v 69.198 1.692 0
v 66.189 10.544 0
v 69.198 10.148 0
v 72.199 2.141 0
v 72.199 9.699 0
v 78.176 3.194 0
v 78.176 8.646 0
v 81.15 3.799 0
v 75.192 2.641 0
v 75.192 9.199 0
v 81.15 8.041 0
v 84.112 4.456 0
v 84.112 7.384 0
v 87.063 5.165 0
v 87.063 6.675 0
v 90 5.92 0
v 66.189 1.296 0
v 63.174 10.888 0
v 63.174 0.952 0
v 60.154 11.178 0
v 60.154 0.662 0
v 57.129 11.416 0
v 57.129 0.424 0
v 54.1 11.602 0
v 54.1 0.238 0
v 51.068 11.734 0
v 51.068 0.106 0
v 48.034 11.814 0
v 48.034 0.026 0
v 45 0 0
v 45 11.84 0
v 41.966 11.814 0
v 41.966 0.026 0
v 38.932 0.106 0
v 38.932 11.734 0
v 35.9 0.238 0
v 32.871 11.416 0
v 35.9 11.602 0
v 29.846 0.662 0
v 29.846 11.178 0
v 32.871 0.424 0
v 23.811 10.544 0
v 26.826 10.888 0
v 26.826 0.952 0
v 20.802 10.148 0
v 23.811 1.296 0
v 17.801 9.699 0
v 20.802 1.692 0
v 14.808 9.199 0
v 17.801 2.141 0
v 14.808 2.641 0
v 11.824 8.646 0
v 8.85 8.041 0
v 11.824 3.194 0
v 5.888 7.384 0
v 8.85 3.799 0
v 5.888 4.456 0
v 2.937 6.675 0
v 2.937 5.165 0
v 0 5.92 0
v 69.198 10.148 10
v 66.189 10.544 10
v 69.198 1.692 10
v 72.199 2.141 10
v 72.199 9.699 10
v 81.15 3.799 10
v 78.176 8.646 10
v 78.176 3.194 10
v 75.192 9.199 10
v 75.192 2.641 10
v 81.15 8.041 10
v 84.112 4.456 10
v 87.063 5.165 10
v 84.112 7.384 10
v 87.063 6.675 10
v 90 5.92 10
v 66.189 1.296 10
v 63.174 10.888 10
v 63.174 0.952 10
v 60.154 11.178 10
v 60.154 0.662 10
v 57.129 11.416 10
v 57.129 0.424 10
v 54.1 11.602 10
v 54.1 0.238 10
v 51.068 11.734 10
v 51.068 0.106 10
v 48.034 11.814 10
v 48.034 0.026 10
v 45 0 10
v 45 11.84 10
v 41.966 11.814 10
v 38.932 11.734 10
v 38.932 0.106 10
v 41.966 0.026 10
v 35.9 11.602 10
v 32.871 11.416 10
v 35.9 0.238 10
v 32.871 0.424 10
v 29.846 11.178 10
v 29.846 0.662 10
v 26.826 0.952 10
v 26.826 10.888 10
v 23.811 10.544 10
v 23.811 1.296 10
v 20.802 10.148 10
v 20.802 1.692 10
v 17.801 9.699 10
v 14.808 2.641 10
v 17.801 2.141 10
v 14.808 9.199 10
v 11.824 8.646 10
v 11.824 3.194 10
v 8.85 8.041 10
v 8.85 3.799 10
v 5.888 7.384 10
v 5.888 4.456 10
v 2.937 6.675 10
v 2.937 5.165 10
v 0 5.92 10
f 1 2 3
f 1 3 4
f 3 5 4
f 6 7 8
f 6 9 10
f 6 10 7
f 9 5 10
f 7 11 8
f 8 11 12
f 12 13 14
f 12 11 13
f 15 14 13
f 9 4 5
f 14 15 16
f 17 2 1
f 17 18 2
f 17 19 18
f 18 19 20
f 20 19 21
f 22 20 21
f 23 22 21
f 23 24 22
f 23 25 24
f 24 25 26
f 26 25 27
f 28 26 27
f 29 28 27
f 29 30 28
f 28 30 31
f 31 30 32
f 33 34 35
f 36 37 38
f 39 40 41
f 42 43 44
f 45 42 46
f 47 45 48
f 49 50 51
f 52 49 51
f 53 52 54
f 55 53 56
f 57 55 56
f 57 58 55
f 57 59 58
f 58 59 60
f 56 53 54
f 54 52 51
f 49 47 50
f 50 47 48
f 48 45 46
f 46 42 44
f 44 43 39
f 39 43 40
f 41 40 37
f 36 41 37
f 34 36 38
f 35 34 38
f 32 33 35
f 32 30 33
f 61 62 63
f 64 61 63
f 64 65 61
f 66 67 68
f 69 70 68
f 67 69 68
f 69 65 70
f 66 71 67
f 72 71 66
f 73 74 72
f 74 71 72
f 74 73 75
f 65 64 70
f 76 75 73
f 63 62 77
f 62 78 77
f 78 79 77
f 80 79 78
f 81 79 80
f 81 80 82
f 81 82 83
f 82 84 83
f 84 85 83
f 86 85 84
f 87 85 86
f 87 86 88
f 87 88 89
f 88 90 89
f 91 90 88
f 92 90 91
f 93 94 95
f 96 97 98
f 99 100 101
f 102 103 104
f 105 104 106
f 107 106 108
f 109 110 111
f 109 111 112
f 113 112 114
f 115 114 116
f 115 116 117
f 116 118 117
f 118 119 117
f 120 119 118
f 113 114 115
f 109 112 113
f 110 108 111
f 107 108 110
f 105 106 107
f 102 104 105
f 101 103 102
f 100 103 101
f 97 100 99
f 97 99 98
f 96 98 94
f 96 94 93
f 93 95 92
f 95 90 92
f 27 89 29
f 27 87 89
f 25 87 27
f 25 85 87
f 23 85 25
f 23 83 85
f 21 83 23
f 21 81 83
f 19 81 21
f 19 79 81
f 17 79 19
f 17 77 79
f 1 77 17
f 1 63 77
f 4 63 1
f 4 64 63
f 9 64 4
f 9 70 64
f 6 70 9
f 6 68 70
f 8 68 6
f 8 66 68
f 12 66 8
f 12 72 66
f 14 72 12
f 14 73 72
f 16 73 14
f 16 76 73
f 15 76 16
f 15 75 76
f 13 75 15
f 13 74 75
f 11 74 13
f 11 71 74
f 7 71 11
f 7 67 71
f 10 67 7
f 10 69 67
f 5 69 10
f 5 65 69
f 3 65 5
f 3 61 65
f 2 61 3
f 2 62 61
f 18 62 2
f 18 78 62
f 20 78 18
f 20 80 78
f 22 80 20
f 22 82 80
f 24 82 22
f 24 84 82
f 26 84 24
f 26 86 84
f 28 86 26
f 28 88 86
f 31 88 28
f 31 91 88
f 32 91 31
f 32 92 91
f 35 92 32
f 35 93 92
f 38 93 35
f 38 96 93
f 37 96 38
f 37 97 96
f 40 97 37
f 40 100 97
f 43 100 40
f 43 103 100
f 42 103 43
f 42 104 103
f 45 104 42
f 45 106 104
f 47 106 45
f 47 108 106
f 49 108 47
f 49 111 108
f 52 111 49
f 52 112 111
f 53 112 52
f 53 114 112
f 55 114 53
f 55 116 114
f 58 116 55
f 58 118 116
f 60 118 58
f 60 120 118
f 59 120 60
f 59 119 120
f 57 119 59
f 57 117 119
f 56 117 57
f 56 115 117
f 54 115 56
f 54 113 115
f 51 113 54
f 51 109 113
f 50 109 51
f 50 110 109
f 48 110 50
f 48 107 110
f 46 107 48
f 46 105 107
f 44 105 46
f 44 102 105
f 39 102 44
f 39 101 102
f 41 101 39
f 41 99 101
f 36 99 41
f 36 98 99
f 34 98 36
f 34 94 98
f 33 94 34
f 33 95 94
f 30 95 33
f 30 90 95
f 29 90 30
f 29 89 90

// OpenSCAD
$fn = 32;

// ----------------------------------------------------------------------
// Arc profile plate: lens, 60 points
// ----------------------------------------------------------------------

// --- parameters (mm) ---
lens_chord = 90;          // chord length of the lens, X
arc_r = 173.87;           // radius of both arcs
arc_angle = 30;           // angle of each arc, degrees
sagitta = 5.92;           // bulge of each arc (half the lens height)
arc_step = 1;             // sampling step of the arcs, degrees
plate_t = 10;             // plate thickness, Z

bbox_y = 2 * sagitta;  // full lens height

profile = [[90, 5.92], [87.063, 6.675], [84.112, 7.384], [81.15, 8.041], [78.176, 8.646], [75.192, 9.199], [72.199, 9.699], [69.198, 10.148], [66.189, 10.544], [63.174, 10.888], [60.154, 11.178], [57.129, 11.416], [54.1, 11.602], [51.068, 11.734], [48.034, 11.814], [45, 11.84], [41.966, 11.814], [38.932, 11.734], [35.9, 11.602], [32.871, 11.416], [29.846, 11.178], [26.826, 10.888], [23.811, 10.544], [20.802, 10.148], [17.801, 9.699], [14.808, 9.199], [11.824, 8.646], [8.85, 8.041], [5.888, 7.384], [2.937, 6.675], [0, 5.92], [2.937, 5.165], [5.888, 4.456], [8.85, 3.799], [11.824, 3.194], [14.808, 2.641], [17.801, 2.141], [20.802, 1.692], [23.811, 1.296], [26.826, 0.952], [29.846, 0.662], [32.871, 0.424], [35.9, 0.238], [38.932, 0.106], [41.966, 0.026], [45, 0], [48.034, 0.026], [51.068, 0.106], [54.1, 0.238], [57.129, 0.424], [60.154, 0.662], [63.174, 0.952], [66.189, 1.296], [69.198, 1.692], [72.199, 2.141], [75.192, 2.641], [78.176, 3.194], [81.15, 3.799], [84.112, 4.456], [87.063, 5.165]];  // primary outline, 60 points, counter clockwise

// --- the one profile operation ---
linear_extrude(height = plate_t) polygon(points = profile);
